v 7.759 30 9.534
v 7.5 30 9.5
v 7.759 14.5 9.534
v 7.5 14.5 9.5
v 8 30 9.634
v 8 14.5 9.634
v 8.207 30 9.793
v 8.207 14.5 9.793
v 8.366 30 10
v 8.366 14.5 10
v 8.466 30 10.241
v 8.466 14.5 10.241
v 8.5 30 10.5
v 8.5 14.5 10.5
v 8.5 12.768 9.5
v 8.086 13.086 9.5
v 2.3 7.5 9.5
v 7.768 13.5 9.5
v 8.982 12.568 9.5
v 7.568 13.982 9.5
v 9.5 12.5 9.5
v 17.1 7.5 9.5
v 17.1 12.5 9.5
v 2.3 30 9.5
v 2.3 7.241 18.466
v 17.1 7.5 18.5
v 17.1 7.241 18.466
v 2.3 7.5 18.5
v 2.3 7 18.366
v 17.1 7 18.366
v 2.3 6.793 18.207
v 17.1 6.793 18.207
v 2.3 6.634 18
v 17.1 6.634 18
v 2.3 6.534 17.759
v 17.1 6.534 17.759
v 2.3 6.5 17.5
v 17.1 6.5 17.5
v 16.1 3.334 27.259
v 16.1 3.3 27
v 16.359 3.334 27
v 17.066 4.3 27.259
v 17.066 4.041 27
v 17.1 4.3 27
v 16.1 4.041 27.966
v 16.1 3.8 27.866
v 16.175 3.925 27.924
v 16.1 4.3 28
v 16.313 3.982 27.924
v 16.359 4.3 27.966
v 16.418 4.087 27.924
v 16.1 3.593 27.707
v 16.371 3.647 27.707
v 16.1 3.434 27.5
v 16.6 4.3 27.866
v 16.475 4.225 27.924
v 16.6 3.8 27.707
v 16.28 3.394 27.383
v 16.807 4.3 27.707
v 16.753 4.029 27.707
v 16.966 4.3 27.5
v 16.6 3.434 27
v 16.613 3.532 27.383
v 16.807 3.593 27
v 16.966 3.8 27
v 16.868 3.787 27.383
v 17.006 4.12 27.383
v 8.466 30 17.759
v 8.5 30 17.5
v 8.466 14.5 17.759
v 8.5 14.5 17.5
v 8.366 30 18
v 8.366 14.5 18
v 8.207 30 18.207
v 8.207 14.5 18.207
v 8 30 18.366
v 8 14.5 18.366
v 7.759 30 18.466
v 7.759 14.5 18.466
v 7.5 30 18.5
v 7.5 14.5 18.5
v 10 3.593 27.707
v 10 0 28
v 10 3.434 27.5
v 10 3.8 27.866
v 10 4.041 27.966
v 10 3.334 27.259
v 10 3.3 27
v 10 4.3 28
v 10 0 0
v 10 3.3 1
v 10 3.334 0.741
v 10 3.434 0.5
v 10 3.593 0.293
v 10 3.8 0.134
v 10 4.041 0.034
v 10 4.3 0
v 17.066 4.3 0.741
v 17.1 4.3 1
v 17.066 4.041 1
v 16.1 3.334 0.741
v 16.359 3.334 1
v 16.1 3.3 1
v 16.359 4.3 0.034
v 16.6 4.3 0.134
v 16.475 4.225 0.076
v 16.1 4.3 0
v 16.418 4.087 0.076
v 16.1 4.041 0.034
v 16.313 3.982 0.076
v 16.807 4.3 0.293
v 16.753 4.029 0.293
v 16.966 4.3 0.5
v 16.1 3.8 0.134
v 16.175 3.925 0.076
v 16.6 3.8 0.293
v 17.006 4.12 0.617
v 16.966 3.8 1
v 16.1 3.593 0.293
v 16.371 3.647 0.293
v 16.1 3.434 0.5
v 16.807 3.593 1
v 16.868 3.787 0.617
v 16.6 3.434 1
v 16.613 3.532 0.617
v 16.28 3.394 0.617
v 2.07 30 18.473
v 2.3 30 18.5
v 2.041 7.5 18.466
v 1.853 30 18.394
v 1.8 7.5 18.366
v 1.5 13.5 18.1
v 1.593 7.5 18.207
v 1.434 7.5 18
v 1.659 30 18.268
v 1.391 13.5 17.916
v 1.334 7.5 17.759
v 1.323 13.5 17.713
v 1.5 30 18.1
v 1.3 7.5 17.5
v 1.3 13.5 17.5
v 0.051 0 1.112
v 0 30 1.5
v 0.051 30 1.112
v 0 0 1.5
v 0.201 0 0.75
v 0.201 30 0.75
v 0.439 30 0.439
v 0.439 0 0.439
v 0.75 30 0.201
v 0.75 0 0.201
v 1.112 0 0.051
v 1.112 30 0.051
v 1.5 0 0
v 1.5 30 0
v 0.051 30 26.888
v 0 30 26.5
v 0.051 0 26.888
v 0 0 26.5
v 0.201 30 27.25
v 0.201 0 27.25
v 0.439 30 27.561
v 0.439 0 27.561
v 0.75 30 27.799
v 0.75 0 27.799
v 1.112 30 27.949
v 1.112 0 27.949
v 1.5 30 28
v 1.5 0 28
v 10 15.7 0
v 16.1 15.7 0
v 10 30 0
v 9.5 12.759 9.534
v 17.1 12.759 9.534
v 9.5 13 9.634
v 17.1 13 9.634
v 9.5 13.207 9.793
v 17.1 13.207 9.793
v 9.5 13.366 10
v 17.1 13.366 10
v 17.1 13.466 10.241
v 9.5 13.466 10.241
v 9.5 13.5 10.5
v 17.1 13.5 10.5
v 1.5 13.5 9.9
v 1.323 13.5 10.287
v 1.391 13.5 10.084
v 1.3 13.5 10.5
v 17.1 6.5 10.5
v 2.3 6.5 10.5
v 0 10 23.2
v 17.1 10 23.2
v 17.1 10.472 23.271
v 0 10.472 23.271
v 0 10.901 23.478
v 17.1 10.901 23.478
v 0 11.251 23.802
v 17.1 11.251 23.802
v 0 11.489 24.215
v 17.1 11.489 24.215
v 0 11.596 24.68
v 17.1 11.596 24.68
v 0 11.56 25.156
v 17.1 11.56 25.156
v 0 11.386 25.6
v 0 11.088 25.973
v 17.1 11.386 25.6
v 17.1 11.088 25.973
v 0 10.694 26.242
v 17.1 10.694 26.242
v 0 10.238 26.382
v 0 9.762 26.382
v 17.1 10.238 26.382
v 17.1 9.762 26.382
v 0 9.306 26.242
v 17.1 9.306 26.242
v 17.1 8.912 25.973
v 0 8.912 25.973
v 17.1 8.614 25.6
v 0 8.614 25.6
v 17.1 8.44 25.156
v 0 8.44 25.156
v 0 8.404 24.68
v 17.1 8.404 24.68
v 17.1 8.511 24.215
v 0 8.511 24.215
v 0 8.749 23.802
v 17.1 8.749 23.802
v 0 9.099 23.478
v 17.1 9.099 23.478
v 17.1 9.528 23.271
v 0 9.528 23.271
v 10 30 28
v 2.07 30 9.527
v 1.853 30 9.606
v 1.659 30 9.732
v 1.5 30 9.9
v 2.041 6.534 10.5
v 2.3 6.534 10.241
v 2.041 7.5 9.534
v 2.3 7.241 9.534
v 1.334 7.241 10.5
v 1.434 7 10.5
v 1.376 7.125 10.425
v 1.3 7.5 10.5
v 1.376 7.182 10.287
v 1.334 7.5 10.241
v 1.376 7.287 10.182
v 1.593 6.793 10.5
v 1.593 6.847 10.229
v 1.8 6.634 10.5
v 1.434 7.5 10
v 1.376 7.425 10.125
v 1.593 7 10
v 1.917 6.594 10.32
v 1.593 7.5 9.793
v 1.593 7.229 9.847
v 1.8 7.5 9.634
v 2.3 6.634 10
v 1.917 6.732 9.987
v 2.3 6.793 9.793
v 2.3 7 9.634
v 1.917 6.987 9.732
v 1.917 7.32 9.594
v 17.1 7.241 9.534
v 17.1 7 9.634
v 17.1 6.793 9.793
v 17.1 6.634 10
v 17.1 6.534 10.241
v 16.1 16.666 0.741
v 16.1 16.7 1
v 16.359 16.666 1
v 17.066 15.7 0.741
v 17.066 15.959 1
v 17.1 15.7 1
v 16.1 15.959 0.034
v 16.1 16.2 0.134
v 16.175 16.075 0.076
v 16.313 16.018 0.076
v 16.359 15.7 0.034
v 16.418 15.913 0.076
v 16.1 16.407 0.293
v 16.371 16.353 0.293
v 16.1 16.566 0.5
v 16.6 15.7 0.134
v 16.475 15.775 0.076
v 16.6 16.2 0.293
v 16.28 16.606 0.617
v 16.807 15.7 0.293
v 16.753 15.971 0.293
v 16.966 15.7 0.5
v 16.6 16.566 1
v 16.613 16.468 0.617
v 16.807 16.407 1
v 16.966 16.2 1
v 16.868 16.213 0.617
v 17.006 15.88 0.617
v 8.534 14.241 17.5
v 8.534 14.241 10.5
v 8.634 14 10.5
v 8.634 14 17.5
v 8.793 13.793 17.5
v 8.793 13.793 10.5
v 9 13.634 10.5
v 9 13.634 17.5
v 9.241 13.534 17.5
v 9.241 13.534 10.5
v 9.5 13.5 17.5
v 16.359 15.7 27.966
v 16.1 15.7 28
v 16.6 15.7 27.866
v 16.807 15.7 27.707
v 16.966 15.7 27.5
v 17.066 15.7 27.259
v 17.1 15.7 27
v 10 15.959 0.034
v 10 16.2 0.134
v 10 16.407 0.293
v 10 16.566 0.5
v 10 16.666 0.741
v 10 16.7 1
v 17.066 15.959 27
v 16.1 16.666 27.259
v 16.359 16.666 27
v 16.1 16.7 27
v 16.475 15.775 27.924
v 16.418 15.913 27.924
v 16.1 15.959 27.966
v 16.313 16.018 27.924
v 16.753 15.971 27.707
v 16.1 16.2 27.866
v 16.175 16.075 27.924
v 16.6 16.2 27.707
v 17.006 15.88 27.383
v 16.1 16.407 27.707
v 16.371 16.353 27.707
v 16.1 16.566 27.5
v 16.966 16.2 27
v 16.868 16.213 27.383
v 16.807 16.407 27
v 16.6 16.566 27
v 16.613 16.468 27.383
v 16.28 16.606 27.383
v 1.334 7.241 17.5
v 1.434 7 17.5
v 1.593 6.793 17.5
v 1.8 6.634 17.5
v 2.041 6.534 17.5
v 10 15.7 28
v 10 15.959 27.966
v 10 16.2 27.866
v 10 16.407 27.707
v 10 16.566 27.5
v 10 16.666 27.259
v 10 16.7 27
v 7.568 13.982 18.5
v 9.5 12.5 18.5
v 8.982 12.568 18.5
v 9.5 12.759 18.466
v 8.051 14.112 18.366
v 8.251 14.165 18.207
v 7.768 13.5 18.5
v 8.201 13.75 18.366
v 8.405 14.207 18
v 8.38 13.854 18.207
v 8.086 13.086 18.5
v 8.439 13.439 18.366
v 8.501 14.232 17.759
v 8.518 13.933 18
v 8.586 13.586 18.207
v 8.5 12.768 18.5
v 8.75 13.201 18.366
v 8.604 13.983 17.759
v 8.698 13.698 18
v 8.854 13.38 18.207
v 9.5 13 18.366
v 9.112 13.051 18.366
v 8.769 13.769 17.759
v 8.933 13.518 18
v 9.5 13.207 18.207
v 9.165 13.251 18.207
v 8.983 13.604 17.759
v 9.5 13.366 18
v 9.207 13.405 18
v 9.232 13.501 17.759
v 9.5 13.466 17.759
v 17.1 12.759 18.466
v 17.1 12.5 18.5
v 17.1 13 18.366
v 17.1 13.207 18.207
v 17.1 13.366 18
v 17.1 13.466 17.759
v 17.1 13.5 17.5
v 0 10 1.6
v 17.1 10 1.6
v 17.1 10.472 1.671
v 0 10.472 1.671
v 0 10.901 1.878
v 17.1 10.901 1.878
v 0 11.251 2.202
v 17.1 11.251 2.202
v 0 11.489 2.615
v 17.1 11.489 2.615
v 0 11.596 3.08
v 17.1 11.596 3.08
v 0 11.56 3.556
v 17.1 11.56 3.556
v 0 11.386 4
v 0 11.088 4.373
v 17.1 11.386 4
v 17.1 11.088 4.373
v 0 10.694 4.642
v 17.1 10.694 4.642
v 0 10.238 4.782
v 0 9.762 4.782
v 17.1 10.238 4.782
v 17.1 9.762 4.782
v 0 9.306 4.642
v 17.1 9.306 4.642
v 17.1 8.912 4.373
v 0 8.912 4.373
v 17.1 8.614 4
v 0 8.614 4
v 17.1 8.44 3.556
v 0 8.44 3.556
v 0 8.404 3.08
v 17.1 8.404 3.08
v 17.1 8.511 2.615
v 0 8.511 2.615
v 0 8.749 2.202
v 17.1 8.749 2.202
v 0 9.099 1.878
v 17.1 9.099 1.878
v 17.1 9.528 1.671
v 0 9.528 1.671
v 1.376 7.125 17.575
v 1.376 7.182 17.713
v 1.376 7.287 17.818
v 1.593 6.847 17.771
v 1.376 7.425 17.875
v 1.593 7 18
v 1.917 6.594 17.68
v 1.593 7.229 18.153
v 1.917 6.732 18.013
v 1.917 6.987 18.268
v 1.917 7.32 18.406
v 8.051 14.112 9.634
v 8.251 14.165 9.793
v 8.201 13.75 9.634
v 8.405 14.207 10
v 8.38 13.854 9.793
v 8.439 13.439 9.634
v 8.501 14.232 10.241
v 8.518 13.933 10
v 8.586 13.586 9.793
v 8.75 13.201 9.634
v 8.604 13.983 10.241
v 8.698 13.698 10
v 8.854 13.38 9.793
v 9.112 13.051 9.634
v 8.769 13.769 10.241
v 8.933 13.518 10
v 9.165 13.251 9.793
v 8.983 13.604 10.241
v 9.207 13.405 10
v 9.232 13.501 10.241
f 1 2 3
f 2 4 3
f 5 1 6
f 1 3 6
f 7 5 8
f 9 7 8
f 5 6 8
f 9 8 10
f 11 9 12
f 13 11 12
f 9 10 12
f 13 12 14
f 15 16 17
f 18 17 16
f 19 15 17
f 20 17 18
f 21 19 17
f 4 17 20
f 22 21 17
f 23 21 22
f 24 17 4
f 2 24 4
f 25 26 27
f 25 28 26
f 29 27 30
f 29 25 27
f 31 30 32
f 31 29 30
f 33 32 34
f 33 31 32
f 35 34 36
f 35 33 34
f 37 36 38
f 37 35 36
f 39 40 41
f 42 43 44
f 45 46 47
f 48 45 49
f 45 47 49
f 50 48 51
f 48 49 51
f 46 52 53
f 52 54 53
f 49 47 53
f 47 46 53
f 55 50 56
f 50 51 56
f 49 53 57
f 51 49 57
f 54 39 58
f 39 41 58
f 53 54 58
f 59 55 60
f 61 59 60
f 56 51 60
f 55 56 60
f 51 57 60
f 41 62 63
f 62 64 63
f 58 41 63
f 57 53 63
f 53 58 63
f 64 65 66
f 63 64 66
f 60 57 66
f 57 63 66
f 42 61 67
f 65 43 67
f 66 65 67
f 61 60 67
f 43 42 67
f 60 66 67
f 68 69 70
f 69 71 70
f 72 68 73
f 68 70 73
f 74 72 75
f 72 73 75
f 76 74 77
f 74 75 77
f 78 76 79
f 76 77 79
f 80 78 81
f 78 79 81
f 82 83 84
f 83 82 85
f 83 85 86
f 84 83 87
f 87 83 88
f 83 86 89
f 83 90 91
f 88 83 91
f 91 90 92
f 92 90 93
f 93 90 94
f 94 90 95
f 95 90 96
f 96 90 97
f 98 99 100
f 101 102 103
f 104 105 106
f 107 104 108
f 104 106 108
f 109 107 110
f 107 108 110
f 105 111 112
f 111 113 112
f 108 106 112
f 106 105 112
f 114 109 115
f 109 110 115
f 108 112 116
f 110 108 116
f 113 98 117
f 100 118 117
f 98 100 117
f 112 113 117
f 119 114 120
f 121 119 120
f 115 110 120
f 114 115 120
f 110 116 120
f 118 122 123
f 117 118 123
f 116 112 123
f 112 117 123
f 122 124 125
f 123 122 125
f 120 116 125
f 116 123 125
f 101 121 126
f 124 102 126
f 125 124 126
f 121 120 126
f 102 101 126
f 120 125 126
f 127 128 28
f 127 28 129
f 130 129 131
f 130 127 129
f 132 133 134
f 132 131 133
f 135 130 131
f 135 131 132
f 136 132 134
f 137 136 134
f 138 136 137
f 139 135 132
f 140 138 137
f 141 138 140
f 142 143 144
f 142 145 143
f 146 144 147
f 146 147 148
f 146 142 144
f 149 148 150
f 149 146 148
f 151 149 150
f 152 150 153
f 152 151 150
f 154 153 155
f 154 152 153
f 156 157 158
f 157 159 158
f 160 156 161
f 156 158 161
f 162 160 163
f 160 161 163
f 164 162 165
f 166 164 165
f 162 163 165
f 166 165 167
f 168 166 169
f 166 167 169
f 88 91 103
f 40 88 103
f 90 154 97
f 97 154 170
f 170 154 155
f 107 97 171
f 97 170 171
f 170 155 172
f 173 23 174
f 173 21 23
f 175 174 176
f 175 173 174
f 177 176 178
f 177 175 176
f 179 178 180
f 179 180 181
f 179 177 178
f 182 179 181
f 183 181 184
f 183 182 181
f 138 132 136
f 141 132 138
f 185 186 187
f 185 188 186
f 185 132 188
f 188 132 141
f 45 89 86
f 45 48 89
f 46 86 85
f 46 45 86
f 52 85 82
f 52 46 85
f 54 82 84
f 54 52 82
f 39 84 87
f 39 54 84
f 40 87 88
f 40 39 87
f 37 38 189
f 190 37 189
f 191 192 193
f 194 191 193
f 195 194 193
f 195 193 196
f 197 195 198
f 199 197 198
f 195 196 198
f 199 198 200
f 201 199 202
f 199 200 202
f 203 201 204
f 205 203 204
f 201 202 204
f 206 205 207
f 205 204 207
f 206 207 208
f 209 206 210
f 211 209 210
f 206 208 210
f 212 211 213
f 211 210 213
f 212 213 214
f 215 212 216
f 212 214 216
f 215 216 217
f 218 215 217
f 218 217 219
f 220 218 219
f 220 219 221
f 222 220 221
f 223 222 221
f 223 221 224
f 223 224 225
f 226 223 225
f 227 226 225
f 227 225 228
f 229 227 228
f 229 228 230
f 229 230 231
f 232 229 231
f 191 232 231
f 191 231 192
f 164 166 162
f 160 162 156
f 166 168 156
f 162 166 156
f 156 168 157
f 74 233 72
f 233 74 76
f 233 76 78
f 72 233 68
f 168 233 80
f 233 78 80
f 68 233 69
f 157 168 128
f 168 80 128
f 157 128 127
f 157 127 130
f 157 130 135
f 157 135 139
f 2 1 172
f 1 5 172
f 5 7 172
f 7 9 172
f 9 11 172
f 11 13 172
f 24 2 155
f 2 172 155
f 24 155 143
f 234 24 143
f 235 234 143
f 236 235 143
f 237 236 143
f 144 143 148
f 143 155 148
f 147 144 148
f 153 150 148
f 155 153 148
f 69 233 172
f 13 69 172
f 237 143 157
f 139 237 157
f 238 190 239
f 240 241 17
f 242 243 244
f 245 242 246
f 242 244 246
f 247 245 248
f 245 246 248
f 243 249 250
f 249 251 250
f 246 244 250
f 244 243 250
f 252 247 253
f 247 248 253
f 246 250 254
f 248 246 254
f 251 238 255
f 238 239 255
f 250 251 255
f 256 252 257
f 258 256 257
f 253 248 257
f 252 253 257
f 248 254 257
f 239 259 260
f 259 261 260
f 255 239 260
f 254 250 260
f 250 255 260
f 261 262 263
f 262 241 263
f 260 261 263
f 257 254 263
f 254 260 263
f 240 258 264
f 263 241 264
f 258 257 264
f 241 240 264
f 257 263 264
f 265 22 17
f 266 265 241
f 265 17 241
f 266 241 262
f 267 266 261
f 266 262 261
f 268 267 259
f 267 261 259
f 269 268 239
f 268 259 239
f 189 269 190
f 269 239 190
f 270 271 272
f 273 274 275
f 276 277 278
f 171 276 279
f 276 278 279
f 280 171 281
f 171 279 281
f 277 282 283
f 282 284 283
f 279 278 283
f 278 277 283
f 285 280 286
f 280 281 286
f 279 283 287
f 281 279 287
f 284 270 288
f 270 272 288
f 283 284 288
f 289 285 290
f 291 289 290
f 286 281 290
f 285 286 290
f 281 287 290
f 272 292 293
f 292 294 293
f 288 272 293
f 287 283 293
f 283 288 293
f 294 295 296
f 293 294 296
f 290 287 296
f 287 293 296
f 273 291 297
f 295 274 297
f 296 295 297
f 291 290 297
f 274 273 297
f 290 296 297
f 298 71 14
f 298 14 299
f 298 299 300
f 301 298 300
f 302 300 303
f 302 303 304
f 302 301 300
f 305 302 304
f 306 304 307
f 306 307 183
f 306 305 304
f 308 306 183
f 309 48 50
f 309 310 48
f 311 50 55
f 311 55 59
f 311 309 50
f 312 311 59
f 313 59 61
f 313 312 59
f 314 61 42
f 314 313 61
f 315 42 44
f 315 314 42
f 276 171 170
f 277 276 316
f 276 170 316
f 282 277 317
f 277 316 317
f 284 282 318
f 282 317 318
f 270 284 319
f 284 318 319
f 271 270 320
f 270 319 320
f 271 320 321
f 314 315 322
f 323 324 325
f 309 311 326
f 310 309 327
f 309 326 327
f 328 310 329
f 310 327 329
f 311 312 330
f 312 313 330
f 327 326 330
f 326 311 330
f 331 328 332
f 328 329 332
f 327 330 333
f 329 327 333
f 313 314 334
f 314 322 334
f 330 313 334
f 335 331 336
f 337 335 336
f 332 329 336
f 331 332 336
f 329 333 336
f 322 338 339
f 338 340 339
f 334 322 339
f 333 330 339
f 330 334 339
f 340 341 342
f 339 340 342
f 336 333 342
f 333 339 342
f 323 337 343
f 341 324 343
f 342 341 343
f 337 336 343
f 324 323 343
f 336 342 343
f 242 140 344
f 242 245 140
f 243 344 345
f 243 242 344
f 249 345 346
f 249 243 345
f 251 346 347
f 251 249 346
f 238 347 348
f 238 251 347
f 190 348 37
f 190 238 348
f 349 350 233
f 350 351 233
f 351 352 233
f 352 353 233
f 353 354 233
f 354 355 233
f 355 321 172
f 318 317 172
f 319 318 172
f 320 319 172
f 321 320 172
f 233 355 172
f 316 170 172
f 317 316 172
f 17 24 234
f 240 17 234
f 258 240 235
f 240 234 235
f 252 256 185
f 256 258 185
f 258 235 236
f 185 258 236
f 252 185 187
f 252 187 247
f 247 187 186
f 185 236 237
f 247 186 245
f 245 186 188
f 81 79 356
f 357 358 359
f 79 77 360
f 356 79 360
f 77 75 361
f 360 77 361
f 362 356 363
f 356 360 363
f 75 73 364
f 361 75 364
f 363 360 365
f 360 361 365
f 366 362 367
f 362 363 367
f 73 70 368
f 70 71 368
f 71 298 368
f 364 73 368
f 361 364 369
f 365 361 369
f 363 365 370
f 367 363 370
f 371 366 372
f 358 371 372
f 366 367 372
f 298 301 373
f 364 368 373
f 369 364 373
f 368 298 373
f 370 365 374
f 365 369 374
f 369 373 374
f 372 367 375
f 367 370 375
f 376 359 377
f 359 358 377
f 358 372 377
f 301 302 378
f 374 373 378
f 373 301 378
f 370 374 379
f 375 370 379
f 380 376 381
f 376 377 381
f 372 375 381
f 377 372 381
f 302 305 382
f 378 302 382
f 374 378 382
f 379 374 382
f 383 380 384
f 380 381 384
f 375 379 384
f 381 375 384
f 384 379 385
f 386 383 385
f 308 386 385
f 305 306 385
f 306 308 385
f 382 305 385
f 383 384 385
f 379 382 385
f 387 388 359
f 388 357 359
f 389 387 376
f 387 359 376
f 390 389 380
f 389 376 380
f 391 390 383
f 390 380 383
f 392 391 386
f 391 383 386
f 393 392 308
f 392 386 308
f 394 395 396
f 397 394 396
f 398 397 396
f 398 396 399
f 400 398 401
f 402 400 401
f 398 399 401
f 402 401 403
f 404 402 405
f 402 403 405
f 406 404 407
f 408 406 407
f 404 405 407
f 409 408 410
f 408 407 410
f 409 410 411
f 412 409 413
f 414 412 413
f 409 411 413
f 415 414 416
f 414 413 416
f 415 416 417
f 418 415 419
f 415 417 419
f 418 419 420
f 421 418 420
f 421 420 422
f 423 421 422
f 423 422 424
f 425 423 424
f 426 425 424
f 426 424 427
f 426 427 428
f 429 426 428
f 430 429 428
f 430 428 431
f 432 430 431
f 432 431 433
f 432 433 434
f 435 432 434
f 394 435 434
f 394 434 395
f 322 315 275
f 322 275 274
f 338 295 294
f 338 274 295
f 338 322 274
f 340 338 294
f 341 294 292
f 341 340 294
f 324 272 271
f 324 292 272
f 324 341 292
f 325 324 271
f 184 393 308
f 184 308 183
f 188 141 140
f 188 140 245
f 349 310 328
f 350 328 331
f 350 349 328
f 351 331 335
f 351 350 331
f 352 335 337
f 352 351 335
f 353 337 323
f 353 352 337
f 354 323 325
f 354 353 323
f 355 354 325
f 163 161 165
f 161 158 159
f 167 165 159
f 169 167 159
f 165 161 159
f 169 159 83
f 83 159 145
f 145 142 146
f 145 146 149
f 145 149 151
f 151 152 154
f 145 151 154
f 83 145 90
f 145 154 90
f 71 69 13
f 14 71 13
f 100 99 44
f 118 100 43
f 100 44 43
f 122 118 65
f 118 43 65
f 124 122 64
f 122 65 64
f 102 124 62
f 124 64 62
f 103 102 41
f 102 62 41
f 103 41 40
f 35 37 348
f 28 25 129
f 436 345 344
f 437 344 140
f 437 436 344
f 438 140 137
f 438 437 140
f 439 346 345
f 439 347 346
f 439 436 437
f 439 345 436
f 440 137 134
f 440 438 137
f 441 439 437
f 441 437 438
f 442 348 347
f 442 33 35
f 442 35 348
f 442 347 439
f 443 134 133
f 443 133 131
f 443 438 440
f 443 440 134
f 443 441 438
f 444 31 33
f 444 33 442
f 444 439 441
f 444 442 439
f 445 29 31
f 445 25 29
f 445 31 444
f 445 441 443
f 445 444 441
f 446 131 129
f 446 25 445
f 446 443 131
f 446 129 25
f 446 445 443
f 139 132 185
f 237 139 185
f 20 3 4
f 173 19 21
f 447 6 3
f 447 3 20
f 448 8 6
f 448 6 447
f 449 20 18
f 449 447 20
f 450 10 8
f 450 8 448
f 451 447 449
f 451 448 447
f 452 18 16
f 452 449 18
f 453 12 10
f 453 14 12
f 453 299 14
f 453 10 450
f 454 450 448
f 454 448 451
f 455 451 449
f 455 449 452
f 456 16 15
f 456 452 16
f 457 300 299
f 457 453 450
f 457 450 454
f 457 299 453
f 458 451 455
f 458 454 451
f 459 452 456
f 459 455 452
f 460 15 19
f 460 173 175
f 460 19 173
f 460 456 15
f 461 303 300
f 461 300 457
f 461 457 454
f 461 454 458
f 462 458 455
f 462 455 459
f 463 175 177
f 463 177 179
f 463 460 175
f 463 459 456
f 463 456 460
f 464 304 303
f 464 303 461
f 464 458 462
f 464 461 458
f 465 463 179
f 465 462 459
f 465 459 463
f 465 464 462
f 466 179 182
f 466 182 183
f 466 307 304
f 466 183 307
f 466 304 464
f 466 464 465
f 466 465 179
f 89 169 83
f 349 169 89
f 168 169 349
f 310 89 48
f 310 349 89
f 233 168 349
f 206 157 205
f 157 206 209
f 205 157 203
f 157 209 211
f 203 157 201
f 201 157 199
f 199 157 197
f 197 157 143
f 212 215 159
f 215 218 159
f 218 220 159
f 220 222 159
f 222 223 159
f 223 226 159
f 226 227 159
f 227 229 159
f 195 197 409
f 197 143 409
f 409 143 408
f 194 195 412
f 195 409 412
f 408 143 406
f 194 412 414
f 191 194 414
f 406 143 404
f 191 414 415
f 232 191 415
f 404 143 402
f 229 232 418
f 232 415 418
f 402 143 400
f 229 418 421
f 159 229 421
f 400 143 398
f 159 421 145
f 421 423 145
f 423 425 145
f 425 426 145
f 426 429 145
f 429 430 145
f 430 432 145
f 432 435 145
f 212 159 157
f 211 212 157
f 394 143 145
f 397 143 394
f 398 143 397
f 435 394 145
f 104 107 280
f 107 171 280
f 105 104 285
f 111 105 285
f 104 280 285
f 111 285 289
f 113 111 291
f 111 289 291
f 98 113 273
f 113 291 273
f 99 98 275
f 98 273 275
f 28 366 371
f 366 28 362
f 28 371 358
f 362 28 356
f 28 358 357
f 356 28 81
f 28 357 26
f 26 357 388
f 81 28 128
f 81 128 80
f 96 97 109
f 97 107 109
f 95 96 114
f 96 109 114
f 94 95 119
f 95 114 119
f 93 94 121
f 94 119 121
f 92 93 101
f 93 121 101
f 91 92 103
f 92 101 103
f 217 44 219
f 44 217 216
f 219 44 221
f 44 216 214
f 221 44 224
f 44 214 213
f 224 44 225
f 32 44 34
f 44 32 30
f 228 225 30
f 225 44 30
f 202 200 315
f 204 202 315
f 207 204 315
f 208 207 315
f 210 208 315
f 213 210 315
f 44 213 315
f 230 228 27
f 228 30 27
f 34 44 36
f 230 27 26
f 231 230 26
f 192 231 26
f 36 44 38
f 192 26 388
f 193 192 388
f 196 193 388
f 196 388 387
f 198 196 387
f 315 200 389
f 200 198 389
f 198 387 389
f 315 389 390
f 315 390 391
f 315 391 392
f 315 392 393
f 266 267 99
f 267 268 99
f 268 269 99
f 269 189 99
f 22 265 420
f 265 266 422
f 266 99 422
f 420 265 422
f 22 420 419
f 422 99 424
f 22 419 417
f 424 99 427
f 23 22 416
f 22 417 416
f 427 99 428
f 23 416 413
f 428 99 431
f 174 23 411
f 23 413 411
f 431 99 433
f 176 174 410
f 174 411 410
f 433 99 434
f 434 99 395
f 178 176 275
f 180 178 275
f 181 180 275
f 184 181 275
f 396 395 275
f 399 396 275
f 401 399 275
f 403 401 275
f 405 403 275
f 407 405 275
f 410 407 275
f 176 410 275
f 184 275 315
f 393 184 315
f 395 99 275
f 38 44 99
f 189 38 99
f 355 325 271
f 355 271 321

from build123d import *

# Parameters (mm, degrees)
EXTRUDE_1_DEPTH          = 28
SKETCH_2_R               = 1.6
CUT_EXTRUDE_1_DEPTH      = 1
CUT_EXTRUDE_1_DEPTH_BACK = 18.1
SKETCH_4_W               = 9
SKETCH_4_H               = 7
CUT_EXTRUDE_2_DEPTH      = 15.8
SKETCH_5_W               = 7
SKETCH_5_H               = 9
CUT_EXTRUDE_3_DEPTH      = 23
FILLET_1_R               = 1.5
FILLET_2_R               = 1
FILLET_3_R               = 1


with BuildPart() as part:
    # 草图1 → 凸台-拉伸1 (new body)
    with BuildSketch(Plane.XY):
        Polygon((0, 30), (0, 0), (10, 0), (10, 3.3), (17.1, 3.3), (17.1, 16.7), (10, 16.7), (10, 30), align=None)
    extrude(amount=EXTRUDE_1_DEPTH)

    # 草图2 → 切除-拉伸1 (cut, two sides)
    with BuildSketch(Plane(origin=(17.1, 0, 0), x_dir=(0, 0, -1), z_dir=(1, 0, 0))) as cut_extrude_1_sk:
        with Locations((-24.8, 10)):
            Circle(SKETCH_2_R)
        with Locations((-3.2, 10)):
            Circle(SKETCH_2_R)
    extrude(amount=CUT_EXTRUDE_1_DEPTH, mode=Mode.SUBTRACT)
    extrude(cut_extrude_1_sk.sketch, amount=-CUT_EXTRUDE_1_DEPTH_BACK, mode=Mode.SUBTRACT)

    # 草图4 → 切除-拉伸2 (cut)
    with BuildSketch(Plane(origin=(17.1, 0, 0), x_dir=(0, 0, -1), z_dir=(1, 0, 0))):
        with Locations((-14, 10)):
            Rectangle(SKETCH_4_W, SKETCH_4_H)
    extrude(amount=-CUT_EXTRUDE_2_DEPTH, mode=Mode.SUBTRACT)

    # 草图5 → 切除-拉伸3 (cut)
    with BuildSketch(Plane(origin=(0, 30, 0), x_dir=(1, 0, 0), z_dir=(0, 1, 0))):
        with Locations((5, -14)):
            Rectangle(SKETCH_5_W, SKETCH_5_H)
    extrude(amount=-CUT_EXTRUDE_3_DEPTH, mode=Mode.SUBTRACT)

    # 圆角1
    fillet_1_edges = [part.edges().sort_by_distance(p)[0] for p in [
        (0, 15, 0),
        (0, 15, 28),
    ]]
    fillet(fillet_1_edges, radius=FILLET_1_R)

    # 圆角2
    fillet_2_edges = [part.edges().sort_by_distance(p)[0] for p in [
        (8.5, 13.5, 14),
        (8.5, 21.75, 18.5),
        (8.5, 21.75, 9.5),
        (12.8, 13.5, 18.5),
        (12.8, 13.5, 9.5),
        (9.2, 6.5, 9.5),
        (9.2, 6.5, 18.5),
        (1.3, 6.5, 14),
        (1.3, 10, 18.5),
        (1.3, 10, 9.5),
    ]]
    fillet(fillet_2_edges, radius=FILLET_2_R)

    # 圆角3
    fillet_3_edges = [part.edges().sort_by_distance(p)[0] for p in [
        (17.1, 16.7, 14),
        (17.1, 3.3, 14),
        (13.55, 3.3, 28),
        (17.1, 10, 28),
        (13.55, 16.7, 28),
        (13.55, 16.7, 0),
        (17.1, 10, 0),
        (13.55, 3.3, 0),
    ]]
    fillet(fillet_3_edges, radius=FILLET_3_R)


solid = part.part
